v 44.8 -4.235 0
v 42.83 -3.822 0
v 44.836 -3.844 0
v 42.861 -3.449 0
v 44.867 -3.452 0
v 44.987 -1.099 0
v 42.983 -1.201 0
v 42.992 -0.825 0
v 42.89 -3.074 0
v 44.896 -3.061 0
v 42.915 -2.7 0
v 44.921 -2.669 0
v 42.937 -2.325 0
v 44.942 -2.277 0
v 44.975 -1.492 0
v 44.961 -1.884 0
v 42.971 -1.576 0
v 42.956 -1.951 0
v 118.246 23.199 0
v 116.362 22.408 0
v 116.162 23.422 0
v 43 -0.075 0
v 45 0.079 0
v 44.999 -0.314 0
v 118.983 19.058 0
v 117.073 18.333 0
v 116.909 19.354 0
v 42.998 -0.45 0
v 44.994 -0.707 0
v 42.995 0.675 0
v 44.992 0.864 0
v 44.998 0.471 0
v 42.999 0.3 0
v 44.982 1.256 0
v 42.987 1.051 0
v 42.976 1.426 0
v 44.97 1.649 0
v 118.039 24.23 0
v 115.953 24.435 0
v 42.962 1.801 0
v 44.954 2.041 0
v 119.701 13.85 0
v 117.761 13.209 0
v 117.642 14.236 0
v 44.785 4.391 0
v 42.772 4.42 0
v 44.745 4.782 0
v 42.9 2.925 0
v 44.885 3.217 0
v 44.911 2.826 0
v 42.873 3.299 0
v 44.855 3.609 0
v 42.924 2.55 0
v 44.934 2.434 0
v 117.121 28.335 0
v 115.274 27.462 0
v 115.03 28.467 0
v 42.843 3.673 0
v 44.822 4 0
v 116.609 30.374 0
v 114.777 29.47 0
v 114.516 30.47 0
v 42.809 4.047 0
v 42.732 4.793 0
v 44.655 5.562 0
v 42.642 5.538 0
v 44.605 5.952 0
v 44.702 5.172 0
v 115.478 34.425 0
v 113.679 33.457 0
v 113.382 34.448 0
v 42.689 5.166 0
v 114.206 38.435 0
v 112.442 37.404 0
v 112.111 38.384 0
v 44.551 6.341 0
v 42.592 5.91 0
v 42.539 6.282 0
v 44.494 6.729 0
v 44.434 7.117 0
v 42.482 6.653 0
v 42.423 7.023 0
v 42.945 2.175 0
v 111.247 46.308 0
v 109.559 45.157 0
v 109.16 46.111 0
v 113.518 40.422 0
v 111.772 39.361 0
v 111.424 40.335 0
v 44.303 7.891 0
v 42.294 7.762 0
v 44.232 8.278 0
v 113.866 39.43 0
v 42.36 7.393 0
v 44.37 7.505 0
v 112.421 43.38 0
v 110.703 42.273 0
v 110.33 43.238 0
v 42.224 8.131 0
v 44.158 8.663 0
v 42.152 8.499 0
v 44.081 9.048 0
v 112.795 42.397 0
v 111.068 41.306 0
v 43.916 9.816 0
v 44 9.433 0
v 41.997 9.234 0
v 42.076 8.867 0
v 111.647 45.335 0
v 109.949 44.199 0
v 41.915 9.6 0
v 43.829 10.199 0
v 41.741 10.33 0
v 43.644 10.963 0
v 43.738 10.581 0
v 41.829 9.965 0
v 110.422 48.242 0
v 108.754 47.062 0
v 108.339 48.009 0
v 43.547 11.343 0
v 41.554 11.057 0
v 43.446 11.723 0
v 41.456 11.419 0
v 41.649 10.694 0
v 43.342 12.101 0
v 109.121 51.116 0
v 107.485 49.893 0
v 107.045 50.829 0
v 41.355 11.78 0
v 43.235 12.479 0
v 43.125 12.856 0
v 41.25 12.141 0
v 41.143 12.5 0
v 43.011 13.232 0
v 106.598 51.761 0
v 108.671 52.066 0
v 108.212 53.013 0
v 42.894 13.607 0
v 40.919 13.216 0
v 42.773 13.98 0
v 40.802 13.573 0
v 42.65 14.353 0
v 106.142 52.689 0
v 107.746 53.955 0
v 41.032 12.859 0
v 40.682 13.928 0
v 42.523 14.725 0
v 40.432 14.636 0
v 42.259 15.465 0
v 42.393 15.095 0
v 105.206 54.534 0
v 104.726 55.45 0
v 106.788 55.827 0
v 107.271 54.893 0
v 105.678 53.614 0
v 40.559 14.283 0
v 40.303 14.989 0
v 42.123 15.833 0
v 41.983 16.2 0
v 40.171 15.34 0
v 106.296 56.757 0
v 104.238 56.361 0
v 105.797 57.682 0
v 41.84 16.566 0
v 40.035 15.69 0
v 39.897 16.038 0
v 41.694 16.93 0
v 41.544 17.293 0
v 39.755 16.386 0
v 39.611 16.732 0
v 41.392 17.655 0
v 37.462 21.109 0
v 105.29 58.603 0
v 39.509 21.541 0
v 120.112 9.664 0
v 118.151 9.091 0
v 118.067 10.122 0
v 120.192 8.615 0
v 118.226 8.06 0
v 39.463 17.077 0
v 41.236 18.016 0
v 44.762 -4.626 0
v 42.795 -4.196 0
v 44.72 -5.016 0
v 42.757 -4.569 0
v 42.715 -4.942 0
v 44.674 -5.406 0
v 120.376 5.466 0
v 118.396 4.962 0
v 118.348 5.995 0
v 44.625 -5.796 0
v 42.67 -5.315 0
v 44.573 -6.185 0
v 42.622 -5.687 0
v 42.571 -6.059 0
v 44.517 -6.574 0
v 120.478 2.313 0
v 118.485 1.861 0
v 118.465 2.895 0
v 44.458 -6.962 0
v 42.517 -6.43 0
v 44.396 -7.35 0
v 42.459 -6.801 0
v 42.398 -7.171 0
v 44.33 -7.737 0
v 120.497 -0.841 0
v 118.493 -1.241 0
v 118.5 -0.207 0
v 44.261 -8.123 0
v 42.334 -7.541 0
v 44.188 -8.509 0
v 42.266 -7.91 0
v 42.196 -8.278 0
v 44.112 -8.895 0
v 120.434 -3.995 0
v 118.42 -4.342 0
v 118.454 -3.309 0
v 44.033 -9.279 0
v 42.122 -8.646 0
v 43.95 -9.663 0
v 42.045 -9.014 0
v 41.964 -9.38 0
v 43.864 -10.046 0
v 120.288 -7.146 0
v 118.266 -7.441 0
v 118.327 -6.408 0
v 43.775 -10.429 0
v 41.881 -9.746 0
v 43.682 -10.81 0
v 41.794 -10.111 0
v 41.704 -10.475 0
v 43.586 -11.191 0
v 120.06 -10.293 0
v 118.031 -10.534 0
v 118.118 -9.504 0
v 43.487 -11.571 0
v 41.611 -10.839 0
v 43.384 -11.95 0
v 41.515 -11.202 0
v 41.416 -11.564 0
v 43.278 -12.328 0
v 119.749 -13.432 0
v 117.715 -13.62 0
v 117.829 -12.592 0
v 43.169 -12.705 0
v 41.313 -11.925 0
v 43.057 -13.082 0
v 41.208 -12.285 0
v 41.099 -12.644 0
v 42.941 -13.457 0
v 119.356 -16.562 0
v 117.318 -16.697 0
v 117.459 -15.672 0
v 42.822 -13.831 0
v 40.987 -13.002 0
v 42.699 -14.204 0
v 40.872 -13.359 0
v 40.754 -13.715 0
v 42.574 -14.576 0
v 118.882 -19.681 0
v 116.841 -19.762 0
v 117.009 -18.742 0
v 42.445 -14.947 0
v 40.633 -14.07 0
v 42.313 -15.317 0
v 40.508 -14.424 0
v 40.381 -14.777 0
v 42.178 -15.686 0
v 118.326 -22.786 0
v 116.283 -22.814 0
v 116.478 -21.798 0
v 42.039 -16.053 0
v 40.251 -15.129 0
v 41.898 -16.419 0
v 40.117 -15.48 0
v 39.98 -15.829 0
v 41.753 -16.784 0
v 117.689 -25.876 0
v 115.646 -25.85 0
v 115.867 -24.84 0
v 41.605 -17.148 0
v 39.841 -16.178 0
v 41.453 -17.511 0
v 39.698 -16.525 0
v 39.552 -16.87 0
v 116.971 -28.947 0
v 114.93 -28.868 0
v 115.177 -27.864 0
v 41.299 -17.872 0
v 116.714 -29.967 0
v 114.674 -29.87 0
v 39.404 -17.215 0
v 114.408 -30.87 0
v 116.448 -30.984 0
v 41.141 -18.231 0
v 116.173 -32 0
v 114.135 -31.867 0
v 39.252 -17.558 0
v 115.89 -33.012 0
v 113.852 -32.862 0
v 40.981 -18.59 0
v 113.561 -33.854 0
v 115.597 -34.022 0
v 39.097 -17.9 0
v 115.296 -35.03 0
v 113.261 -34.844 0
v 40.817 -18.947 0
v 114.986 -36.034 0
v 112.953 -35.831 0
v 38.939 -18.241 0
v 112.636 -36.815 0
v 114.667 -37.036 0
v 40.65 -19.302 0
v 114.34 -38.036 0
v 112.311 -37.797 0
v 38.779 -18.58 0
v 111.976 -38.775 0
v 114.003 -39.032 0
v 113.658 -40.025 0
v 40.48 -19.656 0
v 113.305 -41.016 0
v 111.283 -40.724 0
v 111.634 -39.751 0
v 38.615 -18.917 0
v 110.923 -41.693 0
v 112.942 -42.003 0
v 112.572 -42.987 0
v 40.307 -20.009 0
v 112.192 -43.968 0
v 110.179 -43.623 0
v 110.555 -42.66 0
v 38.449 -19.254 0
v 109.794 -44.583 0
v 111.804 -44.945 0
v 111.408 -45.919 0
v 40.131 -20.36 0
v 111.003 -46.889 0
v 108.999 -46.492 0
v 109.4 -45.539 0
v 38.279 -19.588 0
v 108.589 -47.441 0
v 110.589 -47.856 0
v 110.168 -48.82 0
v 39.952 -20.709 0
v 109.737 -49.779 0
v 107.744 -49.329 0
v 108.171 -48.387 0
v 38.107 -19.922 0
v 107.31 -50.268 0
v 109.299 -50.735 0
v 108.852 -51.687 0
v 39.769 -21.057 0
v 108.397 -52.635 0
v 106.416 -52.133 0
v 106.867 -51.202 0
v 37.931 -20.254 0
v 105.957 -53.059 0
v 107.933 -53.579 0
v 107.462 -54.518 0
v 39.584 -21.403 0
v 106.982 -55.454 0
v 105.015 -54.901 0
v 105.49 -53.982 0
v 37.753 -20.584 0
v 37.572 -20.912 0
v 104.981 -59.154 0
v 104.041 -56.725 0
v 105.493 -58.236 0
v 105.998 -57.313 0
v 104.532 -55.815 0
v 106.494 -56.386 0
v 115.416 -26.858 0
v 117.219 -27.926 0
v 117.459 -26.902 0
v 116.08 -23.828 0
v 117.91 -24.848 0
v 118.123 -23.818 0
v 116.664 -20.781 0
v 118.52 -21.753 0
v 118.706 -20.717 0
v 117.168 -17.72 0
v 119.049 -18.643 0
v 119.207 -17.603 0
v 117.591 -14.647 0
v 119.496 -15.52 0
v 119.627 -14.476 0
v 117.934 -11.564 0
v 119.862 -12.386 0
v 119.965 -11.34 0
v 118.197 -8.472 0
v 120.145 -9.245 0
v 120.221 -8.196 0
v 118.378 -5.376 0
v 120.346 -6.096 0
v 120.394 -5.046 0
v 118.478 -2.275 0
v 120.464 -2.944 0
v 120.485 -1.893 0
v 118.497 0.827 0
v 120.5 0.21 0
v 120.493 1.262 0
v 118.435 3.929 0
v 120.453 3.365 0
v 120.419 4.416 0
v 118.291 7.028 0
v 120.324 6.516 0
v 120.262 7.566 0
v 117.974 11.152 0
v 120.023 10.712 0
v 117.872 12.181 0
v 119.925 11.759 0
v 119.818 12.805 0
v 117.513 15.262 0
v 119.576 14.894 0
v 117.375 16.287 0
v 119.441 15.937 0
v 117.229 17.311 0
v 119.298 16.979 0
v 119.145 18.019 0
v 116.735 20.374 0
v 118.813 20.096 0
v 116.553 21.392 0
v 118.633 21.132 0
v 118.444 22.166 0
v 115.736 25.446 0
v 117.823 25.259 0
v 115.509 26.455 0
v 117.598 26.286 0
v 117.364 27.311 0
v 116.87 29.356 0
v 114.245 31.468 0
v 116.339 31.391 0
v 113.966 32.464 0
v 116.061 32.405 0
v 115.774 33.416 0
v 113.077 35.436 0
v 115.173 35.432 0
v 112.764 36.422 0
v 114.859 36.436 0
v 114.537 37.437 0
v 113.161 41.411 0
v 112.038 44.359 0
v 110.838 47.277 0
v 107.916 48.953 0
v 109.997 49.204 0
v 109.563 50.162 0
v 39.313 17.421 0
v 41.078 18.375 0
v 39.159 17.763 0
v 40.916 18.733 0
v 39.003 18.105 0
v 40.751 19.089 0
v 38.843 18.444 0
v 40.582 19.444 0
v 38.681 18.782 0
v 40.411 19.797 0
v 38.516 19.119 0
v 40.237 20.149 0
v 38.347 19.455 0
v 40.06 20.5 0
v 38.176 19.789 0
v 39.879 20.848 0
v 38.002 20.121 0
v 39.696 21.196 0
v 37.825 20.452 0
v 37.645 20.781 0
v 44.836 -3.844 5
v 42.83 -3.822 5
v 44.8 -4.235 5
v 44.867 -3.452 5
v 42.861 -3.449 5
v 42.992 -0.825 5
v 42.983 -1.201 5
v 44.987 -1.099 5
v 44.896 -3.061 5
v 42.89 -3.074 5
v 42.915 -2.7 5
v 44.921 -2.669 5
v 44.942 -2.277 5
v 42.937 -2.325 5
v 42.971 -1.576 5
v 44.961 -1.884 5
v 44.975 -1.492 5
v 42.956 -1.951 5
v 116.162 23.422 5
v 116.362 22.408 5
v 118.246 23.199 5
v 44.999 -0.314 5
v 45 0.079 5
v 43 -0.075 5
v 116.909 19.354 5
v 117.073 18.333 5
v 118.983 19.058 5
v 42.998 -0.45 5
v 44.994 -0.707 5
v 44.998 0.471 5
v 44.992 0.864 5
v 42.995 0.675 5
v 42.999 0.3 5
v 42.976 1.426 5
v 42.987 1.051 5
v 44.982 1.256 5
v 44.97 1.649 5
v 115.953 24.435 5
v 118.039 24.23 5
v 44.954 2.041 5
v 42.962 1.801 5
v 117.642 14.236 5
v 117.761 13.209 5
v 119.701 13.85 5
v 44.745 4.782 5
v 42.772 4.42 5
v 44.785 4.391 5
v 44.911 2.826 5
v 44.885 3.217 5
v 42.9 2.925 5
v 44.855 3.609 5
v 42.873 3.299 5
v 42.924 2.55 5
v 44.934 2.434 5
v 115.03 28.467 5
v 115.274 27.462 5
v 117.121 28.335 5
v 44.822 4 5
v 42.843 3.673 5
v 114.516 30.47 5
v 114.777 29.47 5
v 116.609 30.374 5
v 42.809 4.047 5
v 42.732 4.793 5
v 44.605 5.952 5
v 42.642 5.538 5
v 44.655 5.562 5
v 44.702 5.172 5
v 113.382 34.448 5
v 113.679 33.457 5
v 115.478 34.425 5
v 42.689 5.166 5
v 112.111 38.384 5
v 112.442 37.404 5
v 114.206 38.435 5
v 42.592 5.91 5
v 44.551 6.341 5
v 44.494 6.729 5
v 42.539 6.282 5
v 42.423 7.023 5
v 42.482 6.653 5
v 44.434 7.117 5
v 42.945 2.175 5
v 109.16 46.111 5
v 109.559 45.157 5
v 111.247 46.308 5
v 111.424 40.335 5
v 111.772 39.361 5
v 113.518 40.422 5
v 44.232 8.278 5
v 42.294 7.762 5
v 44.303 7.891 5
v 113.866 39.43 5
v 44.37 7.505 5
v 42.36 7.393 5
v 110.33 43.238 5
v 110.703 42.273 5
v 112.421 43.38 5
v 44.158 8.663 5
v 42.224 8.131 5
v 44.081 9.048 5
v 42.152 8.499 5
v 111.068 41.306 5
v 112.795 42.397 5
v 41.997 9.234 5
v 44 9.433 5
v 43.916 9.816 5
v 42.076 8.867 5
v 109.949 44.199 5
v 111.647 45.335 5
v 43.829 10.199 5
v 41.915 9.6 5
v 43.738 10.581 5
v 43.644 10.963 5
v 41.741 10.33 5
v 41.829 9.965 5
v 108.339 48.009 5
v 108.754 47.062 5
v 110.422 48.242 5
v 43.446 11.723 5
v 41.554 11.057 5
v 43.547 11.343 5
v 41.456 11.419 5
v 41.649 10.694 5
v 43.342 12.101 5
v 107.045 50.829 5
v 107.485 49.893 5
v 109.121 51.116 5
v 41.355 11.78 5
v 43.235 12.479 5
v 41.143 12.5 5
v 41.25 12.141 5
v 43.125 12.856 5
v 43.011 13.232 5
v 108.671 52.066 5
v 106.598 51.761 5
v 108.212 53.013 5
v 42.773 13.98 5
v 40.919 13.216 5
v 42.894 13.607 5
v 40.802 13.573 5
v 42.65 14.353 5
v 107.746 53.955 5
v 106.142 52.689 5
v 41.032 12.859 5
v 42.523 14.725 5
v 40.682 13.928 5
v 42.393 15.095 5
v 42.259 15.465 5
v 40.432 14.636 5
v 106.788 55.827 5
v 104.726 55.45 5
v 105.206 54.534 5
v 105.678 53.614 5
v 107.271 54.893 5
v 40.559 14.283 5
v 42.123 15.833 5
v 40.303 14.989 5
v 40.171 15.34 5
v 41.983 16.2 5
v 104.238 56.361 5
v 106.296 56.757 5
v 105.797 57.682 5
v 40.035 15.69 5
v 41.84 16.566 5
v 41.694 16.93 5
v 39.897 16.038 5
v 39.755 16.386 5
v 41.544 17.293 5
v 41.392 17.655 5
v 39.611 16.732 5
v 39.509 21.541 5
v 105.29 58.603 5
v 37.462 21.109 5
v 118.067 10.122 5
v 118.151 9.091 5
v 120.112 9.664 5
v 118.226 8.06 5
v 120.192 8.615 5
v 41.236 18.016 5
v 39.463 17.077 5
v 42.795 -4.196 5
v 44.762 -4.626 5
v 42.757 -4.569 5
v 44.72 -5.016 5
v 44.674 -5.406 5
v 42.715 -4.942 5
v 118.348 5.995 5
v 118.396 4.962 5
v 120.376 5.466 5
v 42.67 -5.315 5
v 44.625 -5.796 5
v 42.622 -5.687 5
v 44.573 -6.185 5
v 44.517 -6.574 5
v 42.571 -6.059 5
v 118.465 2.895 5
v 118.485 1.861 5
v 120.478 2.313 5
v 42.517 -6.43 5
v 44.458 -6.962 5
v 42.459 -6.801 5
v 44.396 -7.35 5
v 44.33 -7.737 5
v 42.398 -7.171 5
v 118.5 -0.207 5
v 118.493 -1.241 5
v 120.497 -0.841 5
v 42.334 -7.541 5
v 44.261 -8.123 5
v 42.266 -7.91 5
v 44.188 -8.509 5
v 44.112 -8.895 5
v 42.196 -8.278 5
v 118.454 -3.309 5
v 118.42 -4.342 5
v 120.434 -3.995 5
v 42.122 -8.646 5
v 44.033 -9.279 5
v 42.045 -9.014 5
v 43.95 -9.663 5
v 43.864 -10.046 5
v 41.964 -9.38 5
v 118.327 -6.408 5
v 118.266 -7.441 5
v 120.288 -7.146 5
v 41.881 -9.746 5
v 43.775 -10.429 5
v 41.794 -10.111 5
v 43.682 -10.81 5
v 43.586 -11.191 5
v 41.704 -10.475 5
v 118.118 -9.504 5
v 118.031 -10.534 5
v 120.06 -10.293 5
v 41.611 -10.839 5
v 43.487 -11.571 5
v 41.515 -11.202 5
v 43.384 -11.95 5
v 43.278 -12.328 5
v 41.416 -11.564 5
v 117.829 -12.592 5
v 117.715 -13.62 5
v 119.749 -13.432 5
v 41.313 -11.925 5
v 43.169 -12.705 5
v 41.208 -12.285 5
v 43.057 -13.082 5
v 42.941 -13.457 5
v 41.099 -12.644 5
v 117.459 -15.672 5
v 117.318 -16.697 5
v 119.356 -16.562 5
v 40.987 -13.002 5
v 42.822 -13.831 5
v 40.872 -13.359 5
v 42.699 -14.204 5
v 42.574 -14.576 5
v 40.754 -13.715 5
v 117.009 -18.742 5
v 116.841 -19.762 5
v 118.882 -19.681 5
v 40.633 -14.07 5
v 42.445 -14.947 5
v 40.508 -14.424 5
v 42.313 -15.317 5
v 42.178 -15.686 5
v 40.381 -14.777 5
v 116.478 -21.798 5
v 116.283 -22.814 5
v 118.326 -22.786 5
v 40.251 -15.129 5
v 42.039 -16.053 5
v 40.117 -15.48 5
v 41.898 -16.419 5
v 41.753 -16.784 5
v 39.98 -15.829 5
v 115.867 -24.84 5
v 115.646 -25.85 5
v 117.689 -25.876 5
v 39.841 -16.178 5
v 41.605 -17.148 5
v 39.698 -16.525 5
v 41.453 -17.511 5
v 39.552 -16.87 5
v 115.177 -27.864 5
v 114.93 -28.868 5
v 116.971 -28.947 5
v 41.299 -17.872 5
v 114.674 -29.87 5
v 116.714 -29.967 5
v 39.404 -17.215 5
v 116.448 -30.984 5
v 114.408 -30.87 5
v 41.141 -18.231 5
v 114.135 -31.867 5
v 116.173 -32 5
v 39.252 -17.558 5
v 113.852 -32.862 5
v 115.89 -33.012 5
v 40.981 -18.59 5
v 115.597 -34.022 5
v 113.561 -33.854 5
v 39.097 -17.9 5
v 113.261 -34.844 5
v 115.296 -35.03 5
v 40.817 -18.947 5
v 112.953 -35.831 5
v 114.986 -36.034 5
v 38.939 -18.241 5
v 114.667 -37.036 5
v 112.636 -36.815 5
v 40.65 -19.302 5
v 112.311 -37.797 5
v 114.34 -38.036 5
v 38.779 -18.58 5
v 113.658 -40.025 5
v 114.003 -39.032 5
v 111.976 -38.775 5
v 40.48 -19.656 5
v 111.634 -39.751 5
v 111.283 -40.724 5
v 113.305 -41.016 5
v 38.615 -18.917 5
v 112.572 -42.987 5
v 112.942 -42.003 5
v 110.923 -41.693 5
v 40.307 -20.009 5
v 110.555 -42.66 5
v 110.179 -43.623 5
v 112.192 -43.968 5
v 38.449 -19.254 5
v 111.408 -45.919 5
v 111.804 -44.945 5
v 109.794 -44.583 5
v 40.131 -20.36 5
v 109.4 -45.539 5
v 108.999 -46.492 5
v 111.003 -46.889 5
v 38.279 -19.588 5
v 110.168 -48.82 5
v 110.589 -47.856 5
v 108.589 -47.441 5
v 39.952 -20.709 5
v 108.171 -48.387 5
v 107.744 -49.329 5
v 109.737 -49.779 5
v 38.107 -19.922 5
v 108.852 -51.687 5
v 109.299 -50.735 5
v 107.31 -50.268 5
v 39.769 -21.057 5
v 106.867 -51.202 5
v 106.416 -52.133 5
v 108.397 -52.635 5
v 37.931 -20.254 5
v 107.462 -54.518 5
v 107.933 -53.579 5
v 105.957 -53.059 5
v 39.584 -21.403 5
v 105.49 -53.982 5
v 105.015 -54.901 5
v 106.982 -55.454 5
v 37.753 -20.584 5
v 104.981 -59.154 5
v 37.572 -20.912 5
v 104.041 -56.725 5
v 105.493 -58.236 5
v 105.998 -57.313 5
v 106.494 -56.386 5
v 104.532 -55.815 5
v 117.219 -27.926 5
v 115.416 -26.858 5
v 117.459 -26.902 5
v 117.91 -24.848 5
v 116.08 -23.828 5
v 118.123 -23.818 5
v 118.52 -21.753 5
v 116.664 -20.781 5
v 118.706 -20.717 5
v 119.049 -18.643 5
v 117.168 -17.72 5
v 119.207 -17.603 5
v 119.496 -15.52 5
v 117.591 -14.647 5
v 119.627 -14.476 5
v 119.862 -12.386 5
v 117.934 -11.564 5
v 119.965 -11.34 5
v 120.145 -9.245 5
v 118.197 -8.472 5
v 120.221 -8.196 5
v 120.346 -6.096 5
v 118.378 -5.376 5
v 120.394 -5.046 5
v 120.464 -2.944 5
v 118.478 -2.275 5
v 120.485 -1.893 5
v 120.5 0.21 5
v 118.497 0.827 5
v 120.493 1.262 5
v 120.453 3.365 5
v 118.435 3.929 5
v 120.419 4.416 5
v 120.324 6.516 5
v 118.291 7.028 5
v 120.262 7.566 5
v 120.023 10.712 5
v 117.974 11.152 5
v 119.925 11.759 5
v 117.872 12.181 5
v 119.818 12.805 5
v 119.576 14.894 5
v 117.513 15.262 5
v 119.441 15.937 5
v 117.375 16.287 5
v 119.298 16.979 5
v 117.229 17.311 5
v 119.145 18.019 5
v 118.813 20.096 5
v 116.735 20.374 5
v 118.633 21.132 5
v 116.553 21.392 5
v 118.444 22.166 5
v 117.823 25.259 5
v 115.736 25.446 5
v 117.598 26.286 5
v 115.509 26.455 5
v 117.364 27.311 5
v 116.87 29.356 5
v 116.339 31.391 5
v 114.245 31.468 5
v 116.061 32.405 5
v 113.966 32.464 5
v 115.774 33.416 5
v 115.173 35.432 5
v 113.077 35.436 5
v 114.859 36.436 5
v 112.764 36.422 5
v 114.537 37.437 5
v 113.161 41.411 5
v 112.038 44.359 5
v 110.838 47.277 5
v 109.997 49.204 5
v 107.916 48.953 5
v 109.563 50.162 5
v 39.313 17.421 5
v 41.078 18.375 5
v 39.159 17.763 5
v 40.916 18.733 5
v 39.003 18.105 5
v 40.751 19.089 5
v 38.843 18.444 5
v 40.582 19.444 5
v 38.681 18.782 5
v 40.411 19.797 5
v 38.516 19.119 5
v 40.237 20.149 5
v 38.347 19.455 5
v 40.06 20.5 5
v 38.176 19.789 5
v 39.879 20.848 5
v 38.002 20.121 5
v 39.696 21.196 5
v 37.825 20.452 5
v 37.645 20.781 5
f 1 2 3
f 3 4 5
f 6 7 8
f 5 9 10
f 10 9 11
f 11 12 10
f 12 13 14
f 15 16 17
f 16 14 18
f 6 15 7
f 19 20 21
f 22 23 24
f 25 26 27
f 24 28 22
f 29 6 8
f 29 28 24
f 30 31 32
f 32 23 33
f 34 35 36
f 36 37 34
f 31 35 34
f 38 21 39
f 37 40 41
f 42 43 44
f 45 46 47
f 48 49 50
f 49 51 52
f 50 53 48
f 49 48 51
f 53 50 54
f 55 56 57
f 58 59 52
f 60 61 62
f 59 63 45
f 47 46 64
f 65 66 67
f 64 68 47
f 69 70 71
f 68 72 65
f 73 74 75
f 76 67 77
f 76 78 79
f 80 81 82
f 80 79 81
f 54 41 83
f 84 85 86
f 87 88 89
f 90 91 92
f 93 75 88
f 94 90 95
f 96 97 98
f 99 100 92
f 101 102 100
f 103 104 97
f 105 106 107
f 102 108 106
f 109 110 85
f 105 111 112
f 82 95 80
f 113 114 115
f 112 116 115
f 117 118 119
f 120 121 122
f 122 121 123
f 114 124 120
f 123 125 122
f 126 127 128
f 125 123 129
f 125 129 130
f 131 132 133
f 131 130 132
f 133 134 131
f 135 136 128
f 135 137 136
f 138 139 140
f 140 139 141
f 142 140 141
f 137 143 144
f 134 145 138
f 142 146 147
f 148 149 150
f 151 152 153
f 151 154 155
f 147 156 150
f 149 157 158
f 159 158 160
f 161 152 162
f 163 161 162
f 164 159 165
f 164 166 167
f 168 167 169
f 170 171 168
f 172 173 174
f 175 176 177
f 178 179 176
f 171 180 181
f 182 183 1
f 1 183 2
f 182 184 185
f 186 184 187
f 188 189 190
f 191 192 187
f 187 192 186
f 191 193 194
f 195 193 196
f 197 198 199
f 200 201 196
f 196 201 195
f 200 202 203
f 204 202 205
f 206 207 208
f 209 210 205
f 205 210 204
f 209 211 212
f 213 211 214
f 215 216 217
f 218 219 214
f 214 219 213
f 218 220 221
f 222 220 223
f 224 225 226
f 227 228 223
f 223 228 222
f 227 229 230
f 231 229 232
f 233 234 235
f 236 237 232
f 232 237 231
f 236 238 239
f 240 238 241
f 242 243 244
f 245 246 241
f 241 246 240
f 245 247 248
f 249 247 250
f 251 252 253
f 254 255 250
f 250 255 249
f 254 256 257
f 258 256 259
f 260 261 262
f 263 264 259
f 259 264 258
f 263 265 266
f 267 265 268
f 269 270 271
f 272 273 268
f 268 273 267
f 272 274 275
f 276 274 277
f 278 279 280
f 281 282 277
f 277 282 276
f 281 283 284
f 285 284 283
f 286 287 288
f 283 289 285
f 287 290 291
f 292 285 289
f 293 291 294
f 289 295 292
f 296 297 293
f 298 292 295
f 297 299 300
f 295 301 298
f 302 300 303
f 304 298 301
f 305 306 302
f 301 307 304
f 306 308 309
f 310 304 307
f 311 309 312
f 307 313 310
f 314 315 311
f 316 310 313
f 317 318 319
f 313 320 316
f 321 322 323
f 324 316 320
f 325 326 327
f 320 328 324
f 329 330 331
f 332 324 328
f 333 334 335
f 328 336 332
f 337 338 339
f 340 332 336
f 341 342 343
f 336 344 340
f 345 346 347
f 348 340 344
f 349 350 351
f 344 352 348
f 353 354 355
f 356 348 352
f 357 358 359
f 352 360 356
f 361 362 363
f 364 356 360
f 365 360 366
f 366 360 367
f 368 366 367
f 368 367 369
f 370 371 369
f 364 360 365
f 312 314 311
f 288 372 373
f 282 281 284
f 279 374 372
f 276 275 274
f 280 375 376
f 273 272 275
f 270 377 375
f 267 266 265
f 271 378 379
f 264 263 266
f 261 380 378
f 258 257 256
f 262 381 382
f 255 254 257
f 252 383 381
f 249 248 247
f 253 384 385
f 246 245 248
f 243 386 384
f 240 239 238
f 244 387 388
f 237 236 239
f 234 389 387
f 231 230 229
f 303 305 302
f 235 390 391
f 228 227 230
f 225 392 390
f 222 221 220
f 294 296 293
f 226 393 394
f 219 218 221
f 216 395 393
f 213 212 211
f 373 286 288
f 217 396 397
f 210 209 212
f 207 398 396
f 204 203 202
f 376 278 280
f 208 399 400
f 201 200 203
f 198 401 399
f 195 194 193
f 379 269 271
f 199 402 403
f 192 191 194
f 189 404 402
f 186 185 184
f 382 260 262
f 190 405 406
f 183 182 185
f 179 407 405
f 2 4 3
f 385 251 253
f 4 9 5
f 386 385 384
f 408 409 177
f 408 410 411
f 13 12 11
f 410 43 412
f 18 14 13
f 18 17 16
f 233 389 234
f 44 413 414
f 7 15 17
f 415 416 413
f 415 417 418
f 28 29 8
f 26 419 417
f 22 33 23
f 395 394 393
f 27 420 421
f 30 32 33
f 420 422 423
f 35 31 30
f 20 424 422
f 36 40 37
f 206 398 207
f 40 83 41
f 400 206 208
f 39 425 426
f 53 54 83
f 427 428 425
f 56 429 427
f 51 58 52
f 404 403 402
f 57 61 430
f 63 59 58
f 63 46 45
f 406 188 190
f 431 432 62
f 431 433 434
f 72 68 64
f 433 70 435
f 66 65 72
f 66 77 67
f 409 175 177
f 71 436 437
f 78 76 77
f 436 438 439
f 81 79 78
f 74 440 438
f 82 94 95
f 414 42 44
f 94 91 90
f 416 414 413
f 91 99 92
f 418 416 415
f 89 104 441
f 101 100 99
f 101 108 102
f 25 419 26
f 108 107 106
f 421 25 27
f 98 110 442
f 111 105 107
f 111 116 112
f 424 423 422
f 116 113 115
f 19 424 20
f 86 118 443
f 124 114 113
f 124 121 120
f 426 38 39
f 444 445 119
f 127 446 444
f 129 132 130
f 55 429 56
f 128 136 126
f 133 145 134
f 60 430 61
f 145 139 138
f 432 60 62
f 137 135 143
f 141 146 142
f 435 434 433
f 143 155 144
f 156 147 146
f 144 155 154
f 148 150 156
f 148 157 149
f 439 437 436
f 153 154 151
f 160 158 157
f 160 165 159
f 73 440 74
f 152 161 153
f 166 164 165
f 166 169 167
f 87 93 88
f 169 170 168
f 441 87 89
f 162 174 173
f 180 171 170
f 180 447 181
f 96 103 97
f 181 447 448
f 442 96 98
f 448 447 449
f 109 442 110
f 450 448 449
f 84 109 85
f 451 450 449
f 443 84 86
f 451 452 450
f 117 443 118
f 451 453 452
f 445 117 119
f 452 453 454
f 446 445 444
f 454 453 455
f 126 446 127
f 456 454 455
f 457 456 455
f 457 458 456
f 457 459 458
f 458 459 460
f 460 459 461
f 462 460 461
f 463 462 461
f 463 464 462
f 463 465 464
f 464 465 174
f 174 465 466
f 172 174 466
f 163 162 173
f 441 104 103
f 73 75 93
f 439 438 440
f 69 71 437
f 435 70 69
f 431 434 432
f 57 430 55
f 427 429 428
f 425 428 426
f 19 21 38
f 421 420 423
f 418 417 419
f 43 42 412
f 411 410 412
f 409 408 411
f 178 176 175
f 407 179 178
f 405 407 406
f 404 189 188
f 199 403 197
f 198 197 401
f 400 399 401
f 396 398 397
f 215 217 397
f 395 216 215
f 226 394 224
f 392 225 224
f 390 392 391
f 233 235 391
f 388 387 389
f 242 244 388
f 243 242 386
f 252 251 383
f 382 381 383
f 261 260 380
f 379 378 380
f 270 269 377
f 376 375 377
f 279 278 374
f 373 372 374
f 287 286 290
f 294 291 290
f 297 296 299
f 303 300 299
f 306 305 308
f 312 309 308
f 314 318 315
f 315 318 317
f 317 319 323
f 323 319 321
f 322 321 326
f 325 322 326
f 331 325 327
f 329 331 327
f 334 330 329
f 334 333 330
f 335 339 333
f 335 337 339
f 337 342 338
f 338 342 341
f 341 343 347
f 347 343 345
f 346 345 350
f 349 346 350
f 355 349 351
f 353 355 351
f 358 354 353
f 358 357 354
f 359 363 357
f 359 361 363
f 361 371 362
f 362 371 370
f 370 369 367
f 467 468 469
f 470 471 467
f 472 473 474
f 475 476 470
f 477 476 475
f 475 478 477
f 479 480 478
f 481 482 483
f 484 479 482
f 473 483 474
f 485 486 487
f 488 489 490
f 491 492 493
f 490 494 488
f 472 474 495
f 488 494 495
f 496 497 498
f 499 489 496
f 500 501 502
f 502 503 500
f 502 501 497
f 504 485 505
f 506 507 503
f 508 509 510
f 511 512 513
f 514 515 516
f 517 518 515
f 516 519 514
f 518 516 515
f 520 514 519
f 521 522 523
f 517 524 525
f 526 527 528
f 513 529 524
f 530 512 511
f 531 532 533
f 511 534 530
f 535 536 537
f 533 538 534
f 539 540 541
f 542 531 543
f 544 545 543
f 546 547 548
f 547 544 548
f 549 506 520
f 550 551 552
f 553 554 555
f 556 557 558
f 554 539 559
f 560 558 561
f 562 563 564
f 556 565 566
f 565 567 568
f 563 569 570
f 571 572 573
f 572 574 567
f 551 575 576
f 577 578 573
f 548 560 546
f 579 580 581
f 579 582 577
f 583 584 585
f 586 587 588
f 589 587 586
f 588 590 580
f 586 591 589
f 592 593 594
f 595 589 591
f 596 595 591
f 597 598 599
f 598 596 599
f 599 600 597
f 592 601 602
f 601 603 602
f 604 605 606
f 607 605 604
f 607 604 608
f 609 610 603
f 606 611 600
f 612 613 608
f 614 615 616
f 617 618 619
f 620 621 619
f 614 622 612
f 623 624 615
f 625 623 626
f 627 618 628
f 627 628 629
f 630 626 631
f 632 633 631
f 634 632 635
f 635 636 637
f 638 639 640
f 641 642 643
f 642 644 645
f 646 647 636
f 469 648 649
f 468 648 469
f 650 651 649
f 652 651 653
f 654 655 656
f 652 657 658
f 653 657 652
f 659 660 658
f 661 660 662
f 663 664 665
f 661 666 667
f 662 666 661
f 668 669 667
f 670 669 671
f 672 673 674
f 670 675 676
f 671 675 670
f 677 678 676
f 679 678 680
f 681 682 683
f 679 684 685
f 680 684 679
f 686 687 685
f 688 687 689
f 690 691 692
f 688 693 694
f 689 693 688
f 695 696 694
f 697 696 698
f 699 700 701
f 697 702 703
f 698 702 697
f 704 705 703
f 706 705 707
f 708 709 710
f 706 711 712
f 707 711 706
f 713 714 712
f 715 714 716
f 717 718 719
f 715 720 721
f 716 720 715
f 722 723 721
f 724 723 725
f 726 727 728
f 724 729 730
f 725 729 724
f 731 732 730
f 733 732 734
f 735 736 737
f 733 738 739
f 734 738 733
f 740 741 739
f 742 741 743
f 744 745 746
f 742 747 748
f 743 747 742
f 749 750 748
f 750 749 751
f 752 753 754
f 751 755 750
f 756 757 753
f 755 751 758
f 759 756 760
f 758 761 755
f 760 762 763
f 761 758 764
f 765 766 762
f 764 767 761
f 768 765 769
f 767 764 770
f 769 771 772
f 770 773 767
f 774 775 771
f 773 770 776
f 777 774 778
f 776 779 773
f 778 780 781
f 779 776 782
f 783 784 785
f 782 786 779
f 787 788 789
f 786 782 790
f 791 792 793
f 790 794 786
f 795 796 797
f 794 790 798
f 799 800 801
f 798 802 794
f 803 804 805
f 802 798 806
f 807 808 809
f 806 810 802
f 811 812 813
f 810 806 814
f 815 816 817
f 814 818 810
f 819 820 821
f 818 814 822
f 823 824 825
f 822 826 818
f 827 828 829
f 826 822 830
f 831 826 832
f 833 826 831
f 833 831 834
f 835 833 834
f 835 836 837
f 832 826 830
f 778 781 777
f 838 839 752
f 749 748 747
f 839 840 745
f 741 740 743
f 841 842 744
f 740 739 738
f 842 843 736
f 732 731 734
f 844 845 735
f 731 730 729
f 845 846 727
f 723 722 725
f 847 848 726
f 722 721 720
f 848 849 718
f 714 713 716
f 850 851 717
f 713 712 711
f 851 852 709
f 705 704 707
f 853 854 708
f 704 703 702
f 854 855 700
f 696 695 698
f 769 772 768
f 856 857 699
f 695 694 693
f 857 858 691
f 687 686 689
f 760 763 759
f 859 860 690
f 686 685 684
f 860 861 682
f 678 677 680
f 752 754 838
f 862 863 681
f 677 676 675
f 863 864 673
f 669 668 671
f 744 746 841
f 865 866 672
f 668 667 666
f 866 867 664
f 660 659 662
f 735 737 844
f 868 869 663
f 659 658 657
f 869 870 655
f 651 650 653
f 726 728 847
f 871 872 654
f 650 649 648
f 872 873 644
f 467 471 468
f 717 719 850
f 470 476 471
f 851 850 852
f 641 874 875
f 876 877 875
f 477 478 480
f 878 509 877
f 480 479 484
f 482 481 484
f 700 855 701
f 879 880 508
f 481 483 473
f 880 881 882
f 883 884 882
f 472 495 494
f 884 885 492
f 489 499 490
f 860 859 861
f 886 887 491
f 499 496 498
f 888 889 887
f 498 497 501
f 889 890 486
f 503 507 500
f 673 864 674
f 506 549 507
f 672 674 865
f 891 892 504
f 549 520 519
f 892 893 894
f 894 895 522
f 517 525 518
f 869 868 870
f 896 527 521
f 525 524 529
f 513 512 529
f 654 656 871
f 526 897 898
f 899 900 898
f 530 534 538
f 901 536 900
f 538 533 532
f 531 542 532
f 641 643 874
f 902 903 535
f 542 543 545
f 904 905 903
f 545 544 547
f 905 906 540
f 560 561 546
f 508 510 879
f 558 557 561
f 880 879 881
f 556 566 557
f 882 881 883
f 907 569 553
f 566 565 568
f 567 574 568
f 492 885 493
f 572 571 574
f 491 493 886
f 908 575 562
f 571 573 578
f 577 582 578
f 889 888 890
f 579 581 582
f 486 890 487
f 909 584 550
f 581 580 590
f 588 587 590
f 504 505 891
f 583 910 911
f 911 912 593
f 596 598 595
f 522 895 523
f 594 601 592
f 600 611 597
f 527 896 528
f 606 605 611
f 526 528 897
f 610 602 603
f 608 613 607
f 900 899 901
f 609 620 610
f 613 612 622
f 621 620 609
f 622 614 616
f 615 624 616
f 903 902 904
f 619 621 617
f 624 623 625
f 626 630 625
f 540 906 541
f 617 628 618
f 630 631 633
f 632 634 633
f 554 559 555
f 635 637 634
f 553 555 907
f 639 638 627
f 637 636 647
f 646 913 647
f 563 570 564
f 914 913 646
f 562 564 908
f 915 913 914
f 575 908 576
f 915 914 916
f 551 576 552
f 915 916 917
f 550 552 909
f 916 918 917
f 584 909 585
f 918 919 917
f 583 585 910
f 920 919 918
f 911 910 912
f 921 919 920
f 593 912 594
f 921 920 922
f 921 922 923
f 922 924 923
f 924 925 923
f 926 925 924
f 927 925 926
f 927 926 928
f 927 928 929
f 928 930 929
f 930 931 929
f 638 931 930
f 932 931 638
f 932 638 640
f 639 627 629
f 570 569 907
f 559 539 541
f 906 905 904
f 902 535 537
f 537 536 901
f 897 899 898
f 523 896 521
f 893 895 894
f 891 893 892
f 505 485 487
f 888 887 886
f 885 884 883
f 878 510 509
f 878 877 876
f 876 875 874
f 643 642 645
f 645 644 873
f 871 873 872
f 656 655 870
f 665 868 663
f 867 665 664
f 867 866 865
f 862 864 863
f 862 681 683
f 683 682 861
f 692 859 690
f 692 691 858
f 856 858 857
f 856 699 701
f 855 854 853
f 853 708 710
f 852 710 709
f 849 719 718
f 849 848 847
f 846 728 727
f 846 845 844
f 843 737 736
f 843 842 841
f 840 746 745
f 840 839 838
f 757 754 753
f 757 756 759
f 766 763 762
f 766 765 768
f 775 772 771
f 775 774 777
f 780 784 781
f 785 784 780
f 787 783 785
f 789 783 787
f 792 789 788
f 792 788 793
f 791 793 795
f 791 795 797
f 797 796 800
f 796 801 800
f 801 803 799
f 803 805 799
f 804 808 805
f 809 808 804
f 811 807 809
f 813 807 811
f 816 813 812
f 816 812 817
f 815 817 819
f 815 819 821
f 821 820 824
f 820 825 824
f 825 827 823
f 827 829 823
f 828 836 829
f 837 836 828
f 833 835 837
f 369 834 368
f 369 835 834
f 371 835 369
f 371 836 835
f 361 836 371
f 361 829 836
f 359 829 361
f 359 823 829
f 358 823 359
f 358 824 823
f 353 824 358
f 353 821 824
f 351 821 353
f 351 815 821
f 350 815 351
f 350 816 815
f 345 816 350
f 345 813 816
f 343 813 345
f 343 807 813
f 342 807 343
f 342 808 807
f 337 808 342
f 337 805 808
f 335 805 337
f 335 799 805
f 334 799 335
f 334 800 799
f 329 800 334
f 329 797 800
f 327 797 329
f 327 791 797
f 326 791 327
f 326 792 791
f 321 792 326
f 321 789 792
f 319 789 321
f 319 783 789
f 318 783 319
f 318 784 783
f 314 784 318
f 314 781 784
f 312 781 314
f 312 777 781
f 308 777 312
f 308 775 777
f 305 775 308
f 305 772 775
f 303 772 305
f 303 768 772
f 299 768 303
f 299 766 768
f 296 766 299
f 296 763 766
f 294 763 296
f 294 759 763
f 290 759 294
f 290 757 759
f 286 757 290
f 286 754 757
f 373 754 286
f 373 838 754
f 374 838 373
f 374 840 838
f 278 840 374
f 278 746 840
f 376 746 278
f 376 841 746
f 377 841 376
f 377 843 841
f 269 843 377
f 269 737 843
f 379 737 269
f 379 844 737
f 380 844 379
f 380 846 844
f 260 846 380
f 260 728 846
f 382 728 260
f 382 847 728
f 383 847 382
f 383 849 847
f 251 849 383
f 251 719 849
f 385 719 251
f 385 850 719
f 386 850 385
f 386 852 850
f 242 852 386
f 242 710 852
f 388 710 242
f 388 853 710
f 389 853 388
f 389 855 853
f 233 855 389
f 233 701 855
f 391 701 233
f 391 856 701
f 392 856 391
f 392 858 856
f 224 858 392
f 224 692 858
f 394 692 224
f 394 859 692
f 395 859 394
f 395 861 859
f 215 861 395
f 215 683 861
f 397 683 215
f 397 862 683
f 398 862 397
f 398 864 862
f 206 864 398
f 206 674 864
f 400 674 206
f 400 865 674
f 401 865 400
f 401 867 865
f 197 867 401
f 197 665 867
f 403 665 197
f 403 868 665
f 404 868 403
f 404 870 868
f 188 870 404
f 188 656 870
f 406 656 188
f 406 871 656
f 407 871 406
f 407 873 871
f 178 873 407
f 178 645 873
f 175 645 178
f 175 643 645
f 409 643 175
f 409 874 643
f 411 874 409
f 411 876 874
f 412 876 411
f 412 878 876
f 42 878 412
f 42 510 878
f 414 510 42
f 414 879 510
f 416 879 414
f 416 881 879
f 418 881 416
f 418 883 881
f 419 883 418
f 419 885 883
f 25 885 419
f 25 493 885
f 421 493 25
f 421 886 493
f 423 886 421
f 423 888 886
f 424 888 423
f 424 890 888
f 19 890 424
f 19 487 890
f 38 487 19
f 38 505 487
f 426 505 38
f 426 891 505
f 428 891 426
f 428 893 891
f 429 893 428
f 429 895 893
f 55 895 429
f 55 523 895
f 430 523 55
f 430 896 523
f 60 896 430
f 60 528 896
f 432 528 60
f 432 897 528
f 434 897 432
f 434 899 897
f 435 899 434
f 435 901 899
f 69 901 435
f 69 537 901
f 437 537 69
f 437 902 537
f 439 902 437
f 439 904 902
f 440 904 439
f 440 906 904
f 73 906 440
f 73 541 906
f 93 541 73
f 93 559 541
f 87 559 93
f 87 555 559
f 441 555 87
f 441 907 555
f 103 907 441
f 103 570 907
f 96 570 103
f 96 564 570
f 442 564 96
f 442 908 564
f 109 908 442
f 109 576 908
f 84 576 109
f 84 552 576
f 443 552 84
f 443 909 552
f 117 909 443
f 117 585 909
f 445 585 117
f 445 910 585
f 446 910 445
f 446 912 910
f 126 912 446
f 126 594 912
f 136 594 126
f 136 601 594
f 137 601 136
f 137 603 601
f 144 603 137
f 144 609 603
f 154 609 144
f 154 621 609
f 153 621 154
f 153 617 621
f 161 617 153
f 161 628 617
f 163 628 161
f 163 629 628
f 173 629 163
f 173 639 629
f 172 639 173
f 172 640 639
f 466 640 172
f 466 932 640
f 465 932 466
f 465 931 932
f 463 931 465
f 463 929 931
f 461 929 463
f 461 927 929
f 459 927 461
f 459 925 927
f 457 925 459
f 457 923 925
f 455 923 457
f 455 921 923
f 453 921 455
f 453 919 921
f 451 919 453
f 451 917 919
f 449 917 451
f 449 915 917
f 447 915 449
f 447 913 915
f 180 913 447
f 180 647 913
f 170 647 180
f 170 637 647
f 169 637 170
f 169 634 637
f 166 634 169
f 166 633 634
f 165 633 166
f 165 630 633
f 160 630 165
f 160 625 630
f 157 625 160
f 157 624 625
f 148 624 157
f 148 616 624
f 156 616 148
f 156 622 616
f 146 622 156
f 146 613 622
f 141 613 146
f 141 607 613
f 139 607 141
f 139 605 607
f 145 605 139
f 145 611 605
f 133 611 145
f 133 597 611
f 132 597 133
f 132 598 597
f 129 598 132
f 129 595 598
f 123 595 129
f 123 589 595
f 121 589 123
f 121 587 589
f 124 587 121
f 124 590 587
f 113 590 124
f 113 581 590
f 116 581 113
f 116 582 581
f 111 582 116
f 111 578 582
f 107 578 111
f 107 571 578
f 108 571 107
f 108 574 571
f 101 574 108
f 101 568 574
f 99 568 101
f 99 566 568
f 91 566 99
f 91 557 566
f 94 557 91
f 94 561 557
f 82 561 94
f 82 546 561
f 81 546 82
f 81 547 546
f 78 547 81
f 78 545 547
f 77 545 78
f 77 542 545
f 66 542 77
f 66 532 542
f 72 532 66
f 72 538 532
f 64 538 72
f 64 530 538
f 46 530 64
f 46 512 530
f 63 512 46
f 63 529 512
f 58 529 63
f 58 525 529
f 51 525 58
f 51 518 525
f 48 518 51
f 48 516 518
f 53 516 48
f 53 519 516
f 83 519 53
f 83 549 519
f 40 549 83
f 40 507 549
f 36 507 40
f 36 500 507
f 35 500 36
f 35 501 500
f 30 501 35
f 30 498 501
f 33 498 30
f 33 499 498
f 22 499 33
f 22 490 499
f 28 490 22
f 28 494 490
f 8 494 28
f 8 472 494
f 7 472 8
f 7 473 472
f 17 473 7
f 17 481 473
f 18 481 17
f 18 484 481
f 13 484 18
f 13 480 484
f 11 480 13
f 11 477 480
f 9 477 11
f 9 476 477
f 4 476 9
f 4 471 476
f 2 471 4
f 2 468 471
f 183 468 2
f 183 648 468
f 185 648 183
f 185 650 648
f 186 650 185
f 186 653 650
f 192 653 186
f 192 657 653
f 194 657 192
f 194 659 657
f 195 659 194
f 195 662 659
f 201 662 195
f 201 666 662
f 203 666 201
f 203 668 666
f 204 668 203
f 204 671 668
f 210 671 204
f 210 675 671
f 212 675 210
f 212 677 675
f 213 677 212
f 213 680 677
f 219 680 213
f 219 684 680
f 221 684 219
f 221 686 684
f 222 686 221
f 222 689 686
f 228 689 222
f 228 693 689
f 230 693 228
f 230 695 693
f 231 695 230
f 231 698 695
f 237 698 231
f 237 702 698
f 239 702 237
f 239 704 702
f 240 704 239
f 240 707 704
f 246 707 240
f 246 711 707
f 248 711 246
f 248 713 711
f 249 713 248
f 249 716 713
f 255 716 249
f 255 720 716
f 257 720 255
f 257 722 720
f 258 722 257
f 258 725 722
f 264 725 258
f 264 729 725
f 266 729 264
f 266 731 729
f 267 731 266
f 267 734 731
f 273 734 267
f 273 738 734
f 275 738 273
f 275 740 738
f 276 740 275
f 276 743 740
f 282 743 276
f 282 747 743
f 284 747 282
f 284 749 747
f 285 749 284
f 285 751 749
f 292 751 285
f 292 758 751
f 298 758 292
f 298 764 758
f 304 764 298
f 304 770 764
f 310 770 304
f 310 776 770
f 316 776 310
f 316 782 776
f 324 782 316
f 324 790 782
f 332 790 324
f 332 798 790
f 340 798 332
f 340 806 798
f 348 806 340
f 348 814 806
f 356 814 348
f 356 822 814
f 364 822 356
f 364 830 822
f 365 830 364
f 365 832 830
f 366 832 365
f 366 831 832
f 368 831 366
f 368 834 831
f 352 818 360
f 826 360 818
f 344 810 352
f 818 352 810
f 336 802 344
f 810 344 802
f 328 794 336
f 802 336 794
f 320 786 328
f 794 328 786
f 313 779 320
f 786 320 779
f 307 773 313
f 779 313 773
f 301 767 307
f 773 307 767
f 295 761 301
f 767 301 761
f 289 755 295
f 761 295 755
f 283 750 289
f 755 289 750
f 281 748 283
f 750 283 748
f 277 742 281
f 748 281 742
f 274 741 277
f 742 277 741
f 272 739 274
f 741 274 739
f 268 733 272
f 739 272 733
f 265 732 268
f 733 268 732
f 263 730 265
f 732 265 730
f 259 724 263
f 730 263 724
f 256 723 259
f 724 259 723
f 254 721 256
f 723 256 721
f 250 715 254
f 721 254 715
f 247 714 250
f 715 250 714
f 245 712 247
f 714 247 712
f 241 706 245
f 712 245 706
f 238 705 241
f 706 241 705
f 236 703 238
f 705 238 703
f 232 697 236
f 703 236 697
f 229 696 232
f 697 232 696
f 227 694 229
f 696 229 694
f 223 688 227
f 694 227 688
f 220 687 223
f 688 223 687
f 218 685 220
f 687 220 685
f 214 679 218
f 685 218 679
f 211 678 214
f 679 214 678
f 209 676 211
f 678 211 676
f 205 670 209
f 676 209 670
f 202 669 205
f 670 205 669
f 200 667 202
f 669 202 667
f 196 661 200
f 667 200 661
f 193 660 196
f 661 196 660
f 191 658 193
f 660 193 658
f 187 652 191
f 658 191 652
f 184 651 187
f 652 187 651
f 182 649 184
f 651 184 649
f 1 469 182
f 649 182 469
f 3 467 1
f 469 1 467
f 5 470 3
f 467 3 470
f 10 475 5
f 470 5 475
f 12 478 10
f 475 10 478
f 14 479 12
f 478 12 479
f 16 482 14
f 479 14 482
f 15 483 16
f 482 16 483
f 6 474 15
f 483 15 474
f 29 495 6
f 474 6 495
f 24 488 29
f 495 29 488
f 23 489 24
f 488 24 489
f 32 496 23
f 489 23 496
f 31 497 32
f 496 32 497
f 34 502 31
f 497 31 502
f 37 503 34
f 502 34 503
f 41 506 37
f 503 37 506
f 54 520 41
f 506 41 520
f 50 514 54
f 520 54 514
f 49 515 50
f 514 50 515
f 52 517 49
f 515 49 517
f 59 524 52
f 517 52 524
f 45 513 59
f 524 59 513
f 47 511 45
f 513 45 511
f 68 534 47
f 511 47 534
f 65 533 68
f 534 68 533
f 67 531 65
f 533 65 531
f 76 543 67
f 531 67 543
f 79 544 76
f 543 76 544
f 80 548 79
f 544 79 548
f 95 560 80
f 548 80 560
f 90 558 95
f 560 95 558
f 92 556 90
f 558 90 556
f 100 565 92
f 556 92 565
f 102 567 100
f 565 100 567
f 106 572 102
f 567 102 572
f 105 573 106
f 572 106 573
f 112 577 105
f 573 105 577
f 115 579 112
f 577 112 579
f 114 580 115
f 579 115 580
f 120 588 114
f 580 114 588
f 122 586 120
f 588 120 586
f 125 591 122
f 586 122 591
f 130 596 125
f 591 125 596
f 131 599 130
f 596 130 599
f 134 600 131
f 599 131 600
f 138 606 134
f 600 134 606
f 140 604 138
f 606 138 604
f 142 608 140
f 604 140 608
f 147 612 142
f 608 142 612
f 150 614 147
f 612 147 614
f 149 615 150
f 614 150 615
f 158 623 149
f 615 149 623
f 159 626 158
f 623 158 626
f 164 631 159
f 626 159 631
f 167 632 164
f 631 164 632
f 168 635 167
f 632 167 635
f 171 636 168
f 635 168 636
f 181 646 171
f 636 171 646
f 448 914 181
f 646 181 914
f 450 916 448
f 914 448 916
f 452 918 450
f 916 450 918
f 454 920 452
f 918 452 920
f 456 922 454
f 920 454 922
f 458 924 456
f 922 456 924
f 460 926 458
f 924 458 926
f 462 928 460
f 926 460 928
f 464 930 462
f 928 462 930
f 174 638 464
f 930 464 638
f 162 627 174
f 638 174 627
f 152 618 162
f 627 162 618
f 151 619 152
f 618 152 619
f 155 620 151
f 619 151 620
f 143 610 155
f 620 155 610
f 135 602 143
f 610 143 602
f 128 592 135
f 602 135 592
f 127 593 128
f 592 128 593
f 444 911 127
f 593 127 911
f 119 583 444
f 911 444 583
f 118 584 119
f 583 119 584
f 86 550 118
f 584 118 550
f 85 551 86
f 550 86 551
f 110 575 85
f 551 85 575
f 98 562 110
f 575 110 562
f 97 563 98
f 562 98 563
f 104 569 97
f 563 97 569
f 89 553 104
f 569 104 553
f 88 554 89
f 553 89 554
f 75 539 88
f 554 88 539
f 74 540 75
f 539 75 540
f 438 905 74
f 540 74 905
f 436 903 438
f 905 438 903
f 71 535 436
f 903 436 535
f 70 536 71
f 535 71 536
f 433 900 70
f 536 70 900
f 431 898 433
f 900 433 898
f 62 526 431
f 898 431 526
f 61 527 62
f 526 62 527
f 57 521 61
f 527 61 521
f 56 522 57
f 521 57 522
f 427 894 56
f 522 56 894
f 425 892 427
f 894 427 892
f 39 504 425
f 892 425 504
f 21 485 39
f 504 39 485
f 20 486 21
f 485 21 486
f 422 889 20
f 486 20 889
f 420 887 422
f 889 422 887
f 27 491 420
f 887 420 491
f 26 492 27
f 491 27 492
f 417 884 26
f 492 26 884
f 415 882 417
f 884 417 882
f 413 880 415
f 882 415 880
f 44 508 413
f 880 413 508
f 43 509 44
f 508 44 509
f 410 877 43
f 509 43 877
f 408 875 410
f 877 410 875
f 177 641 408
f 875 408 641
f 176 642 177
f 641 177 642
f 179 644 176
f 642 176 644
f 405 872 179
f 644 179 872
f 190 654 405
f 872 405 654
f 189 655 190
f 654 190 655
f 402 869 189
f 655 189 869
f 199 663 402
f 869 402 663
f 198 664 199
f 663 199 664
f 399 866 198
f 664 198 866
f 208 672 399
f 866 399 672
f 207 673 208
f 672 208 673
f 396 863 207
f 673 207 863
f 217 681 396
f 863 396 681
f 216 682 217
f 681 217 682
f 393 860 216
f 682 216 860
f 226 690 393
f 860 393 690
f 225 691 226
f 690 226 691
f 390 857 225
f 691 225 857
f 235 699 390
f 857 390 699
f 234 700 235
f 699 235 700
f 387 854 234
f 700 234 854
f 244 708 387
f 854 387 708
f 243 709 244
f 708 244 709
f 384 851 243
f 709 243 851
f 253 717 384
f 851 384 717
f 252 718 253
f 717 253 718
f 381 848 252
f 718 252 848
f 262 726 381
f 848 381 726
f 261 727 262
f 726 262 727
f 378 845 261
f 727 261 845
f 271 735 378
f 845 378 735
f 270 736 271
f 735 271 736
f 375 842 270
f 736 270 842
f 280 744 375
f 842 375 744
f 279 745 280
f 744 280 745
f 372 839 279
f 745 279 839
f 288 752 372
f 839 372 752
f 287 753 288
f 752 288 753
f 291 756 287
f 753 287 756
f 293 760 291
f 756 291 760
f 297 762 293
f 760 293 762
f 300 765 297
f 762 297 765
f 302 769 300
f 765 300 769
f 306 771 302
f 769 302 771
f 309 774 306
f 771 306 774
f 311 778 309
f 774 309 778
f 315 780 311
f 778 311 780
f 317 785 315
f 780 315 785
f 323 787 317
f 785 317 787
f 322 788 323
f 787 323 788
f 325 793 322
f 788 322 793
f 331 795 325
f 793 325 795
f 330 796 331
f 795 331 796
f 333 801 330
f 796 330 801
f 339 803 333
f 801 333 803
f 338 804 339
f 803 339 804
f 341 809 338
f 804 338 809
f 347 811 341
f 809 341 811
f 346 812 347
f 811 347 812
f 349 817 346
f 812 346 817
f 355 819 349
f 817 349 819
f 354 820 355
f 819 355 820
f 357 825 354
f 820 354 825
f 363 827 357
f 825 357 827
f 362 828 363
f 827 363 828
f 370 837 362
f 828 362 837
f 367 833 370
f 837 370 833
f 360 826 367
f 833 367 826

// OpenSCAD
// PoolGuard Passschablone V1
// Fit-test frame for skimmer compartments 3 and 4.
// This is not the final housing.

$fn = 180;

lid_diameter = 242.0;
compartment_depth = 78.5;
radial_clearance = 0.5;
angular_clearance = 0.6;
wall = 2.0;
height = 5.0;

outer_radius = lid_diameter / 2 - radial_clearance;
inner_radius = lid_diameter / 2 - compartment_depth + radial_clearance;
start_angle = -30 + angular_clearance;
end_angle = 30 - angular_clearance;

module sector_2d(ri, ro, a0, a1, step = 0.5) {
    polygon(points = concat(
        [for (a = [a0 : step : a1]) [ro * cos(a), ro * sin(a)]],
        [for (a = [a1 : -step : a0]) [ri * cos(a), ri * sin(a)]]
    ));
}

linear_extrude(height = height)
difference() {
    sector_2d(inner_radius, outer_radius, start_angle, end_angle);
    sector_2d(
        inner_radius + wall,
        outer_radius - wall,
        start_angle + 0.8,
        end_angle - 0.8
    );
}
